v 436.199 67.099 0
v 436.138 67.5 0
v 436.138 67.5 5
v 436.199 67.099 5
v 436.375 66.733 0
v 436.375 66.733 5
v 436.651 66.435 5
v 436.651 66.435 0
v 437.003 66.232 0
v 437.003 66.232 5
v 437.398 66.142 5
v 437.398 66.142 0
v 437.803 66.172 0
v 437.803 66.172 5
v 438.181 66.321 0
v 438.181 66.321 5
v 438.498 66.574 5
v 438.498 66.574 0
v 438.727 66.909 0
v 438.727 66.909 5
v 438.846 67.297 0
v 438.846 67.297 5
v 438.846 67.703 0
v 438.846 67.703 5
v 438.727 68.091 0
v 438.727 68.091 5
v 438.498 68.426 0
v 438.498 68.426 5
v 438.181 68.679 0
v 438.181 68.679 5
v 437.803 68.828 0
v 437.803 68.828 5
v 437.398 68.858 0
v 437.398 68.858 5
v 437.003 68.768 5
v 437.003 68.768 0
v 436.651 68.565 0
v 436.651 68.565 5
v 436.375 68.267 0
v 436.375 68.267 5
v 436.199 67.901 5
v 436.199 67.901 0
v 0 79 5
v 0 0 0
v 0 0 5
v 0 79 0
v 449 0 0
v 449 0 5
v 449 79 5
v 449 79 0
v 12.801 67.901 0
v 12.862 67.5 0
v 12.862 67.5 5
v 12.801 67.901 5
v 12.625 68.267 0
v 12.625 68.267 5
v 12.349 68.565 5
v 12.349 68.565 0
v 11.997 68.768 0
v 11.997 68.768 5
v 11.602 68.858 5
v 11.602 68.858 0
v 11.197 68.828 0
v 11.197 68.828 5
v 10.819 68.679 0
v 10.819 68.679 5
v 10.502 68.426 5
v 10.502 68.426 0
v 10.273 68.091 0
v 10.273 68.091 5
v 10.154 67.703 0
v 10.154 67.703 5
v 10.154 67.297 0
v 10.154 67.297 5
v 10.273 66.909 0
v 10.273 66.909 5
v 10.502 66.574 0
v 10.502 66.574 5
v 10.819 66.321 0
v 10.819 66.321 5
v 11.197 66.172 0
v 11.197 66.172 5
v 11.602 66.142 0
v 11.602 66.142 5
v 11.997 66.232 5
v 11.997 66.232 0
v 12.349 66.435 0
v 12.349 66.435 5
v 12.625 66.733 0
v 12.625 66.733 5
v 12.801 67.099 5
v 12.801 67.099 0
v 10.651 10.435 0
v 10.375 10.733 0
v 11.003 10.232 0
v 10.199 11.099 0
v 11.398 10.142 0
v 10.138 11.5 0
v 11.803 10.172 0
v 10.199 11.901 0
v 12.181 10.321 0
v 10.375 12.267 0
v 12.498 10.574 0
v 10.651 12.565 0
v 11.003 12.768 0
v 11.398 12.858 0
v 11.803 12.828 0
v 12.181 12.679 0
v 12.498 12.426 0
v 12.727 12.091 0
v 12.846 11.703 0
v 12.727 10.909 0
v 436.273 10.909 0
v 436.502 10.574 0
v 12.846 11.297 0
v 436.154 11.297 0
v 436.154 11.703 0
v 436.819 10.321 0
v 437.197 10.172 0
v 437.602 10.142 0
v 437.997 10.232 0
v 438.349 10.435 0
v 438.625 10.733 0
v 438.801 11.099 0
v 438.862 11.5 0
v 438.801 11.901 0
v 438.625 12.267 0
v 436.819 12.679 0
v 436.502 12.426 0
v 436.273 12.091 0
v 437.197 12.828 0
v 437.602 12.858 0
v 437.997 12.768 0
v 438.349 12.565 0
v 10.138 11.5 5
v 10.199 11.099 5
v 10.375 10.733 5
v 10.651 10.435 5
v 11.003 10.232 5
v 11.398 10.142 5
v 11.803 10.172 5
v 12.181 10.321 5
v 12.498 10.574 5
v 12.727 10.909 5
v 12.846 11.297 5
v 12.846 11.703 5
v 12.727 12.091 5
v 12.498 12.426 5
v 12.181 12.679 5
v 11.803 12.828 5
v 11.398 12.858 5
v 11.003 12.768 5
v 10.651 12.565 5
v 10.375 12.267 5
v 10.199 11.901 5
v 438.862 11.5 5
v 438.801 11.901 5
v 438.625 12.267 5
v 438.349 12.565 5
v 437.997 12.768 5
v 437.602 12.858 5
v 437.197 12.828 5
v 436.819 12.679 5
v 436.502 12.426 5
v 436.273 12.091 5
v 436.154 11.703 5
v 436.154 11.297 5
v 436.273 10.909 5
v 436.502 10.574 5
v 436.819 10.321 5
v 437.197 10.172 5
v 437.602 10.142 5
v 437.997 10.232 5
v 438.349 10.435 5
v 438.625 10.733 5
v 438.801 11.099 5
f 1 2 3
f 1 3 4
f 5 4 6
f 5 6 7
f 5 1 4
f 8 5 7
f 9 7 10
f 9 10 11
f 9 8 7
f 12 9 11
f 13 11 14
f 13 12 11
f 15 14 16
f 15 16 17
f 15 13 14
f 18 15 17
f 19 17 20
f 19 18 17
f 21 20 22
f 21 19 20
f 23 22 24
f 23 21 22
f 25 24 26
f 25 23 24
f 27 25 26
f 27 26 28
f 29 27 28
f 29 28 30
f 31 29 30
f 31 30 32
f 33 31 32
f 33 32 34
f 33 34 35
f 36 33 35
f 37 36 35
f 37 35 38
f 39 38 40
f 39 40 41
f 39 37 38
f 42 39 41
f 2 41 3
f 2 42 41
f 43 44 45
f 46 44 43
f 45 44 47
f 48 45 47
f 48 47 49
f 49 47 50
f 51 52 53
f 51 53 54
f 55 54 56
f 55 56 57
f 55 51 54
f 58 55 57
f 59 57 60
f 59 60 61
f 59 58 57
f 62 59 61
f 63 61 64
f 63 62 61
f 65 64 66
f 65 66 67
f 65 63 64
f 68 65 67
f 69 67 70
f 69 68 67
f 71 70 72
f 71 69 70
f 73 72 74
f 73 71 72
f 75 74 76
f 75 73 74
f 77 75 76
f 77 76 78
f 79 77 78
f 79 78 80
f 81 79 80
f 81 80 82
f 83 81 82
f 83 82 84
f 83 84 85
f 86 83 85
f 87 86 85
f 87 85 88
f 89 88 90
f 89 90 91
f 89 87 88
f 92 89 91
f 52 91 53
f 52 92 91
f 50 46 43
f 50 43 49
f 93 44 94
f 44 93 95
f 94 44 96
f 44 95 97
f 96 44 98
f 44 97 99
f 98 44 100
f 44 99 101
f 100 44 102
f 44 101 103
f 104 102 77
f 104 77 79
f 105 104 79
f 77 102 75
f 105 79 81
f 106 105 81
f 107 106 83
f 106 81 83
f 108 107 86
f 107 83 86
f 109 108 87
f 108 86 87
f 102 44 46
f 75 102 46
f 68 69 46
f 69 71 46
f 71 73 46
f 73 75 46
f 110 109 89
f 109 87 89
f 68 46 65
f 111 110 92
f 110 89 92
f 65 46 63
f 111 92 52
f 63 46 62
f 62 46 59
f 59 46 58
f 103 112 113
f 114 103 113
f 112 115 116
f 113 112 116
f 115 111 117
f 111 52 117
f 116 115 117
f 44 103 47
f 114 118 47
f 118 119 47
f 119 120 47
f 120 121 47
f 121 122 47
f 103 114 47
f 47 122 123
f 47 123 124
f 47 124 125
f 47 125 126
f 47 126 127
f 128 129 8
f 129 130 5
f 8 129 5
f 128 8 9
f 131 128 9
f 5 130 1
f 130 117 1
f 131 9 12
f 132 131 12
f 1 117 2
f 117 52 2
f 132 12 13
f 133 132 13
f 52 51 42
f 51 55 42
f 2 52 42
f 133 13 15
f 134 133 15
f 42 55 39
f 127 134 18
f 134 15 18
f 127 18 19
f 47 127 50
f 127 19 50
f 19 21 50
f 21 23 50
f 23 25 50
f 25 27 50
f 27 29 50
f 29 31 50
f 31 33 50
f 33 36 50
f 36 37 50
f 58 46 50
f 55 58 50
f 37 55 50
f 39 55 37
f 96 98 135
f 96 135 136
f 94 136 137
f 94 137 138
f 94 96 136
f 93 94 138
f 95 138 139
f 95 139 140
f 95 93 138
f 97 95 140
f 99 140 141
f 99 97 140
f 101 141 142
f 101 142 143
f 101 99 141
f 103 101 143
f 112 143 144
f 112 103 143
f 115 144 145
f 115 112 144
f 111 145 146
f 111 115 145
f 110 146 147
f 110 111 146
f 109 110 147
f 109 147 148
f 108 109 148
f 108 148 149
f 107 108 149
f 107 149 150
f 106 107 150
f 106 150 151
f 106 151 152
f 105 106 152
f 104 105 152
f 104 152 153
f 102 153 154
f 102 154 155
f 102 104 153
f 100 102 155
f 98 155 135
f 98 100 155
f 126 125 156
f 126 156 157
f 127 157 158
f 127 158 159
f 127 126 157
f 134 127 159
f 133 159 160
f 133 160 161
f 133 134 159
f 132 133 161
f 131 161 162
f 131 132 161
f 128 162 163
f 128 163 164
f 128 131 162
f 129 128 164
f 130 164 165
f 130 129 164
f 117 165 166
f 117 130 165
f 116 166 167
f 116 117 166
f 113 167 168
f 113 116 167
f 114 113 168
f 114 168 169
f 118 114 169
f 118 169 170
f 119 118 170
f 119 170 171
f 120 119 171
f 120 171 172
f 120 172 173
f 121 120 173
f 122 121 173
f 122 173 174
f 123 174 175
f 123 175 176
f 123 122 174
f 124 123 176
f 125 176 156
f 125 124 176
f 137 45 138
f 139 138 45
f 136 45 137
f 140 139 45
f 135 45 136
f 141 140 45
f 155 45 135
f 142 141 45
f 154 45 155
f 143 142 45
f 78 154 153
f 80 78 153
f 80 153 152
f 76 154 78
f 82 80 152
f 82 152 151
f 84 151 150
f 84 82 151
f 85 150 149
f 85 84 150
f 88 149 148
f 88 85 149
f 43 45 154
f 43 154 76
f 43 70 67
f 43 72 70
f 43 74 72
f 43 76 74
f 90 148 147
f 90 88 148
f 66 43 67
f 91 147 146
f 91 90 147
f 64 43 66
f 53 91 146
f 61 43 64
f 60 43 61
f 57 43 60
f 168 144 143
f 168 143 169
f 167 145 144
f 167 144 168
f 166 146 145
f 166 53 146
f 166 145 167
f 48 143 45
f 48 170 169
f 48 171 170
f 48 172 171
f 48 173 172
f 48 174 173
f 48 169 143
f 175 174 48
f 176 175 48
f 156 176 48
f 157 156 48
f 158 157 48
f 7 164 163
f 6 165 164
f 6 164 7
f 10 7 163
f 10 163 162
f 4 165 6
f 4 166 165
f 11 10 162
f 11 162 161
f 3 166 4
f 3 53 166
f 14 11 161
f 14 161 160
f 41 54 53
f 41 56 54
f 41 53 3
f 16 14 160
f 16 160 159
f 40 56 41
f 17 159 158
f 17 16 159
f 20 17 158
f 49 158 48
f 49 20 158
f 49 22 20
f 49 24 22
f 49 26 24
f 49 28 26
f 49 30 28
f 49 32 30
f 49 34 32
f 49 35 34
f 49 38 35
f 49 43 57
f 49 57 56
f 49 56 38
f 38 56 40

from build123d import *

# Parameters (mm, degrees)
SKETCH_F_W                   = 449
SKETCH_F_H                   = 79
SKETCH_F_R                   = 1.361667817
ESTRUSIONE_ESTRUSIONE1_DEPTH = 5


with BuildPart() as part:
    # Sketch f → Estrusione-Estrusione1 (new body)
    with BuildSketch(Plane.XY):
        with Locations((224.5, 39.5)):
            Rectangle(SKETCH_F_W, SKETCH_F_H)
        with Locations((11.5, 67.5)):
            Circle(SKETCH_F_R, mode=Mode.SUBTRACT)
        with Locations(Location((437.5, 67.5, 0), (0, 0, 180))):
            Circle(SKETCH_F_R, mode=Mode.SUBTRACT)
        with Locations(Location((11.5, 11.5, 0), (0, 0, 180))):
            Circle(SKETCH_F_R, mode=Mode.SUBTRACT)
        with Locations((437.5, 11.5)):
            Circle(SKETCH_F_R, mode=Mode.SUBTRACT)
    extrude(amount=ESTRUSIONE_ESTRUSIONE1_DEPTH)


solid = part.part
